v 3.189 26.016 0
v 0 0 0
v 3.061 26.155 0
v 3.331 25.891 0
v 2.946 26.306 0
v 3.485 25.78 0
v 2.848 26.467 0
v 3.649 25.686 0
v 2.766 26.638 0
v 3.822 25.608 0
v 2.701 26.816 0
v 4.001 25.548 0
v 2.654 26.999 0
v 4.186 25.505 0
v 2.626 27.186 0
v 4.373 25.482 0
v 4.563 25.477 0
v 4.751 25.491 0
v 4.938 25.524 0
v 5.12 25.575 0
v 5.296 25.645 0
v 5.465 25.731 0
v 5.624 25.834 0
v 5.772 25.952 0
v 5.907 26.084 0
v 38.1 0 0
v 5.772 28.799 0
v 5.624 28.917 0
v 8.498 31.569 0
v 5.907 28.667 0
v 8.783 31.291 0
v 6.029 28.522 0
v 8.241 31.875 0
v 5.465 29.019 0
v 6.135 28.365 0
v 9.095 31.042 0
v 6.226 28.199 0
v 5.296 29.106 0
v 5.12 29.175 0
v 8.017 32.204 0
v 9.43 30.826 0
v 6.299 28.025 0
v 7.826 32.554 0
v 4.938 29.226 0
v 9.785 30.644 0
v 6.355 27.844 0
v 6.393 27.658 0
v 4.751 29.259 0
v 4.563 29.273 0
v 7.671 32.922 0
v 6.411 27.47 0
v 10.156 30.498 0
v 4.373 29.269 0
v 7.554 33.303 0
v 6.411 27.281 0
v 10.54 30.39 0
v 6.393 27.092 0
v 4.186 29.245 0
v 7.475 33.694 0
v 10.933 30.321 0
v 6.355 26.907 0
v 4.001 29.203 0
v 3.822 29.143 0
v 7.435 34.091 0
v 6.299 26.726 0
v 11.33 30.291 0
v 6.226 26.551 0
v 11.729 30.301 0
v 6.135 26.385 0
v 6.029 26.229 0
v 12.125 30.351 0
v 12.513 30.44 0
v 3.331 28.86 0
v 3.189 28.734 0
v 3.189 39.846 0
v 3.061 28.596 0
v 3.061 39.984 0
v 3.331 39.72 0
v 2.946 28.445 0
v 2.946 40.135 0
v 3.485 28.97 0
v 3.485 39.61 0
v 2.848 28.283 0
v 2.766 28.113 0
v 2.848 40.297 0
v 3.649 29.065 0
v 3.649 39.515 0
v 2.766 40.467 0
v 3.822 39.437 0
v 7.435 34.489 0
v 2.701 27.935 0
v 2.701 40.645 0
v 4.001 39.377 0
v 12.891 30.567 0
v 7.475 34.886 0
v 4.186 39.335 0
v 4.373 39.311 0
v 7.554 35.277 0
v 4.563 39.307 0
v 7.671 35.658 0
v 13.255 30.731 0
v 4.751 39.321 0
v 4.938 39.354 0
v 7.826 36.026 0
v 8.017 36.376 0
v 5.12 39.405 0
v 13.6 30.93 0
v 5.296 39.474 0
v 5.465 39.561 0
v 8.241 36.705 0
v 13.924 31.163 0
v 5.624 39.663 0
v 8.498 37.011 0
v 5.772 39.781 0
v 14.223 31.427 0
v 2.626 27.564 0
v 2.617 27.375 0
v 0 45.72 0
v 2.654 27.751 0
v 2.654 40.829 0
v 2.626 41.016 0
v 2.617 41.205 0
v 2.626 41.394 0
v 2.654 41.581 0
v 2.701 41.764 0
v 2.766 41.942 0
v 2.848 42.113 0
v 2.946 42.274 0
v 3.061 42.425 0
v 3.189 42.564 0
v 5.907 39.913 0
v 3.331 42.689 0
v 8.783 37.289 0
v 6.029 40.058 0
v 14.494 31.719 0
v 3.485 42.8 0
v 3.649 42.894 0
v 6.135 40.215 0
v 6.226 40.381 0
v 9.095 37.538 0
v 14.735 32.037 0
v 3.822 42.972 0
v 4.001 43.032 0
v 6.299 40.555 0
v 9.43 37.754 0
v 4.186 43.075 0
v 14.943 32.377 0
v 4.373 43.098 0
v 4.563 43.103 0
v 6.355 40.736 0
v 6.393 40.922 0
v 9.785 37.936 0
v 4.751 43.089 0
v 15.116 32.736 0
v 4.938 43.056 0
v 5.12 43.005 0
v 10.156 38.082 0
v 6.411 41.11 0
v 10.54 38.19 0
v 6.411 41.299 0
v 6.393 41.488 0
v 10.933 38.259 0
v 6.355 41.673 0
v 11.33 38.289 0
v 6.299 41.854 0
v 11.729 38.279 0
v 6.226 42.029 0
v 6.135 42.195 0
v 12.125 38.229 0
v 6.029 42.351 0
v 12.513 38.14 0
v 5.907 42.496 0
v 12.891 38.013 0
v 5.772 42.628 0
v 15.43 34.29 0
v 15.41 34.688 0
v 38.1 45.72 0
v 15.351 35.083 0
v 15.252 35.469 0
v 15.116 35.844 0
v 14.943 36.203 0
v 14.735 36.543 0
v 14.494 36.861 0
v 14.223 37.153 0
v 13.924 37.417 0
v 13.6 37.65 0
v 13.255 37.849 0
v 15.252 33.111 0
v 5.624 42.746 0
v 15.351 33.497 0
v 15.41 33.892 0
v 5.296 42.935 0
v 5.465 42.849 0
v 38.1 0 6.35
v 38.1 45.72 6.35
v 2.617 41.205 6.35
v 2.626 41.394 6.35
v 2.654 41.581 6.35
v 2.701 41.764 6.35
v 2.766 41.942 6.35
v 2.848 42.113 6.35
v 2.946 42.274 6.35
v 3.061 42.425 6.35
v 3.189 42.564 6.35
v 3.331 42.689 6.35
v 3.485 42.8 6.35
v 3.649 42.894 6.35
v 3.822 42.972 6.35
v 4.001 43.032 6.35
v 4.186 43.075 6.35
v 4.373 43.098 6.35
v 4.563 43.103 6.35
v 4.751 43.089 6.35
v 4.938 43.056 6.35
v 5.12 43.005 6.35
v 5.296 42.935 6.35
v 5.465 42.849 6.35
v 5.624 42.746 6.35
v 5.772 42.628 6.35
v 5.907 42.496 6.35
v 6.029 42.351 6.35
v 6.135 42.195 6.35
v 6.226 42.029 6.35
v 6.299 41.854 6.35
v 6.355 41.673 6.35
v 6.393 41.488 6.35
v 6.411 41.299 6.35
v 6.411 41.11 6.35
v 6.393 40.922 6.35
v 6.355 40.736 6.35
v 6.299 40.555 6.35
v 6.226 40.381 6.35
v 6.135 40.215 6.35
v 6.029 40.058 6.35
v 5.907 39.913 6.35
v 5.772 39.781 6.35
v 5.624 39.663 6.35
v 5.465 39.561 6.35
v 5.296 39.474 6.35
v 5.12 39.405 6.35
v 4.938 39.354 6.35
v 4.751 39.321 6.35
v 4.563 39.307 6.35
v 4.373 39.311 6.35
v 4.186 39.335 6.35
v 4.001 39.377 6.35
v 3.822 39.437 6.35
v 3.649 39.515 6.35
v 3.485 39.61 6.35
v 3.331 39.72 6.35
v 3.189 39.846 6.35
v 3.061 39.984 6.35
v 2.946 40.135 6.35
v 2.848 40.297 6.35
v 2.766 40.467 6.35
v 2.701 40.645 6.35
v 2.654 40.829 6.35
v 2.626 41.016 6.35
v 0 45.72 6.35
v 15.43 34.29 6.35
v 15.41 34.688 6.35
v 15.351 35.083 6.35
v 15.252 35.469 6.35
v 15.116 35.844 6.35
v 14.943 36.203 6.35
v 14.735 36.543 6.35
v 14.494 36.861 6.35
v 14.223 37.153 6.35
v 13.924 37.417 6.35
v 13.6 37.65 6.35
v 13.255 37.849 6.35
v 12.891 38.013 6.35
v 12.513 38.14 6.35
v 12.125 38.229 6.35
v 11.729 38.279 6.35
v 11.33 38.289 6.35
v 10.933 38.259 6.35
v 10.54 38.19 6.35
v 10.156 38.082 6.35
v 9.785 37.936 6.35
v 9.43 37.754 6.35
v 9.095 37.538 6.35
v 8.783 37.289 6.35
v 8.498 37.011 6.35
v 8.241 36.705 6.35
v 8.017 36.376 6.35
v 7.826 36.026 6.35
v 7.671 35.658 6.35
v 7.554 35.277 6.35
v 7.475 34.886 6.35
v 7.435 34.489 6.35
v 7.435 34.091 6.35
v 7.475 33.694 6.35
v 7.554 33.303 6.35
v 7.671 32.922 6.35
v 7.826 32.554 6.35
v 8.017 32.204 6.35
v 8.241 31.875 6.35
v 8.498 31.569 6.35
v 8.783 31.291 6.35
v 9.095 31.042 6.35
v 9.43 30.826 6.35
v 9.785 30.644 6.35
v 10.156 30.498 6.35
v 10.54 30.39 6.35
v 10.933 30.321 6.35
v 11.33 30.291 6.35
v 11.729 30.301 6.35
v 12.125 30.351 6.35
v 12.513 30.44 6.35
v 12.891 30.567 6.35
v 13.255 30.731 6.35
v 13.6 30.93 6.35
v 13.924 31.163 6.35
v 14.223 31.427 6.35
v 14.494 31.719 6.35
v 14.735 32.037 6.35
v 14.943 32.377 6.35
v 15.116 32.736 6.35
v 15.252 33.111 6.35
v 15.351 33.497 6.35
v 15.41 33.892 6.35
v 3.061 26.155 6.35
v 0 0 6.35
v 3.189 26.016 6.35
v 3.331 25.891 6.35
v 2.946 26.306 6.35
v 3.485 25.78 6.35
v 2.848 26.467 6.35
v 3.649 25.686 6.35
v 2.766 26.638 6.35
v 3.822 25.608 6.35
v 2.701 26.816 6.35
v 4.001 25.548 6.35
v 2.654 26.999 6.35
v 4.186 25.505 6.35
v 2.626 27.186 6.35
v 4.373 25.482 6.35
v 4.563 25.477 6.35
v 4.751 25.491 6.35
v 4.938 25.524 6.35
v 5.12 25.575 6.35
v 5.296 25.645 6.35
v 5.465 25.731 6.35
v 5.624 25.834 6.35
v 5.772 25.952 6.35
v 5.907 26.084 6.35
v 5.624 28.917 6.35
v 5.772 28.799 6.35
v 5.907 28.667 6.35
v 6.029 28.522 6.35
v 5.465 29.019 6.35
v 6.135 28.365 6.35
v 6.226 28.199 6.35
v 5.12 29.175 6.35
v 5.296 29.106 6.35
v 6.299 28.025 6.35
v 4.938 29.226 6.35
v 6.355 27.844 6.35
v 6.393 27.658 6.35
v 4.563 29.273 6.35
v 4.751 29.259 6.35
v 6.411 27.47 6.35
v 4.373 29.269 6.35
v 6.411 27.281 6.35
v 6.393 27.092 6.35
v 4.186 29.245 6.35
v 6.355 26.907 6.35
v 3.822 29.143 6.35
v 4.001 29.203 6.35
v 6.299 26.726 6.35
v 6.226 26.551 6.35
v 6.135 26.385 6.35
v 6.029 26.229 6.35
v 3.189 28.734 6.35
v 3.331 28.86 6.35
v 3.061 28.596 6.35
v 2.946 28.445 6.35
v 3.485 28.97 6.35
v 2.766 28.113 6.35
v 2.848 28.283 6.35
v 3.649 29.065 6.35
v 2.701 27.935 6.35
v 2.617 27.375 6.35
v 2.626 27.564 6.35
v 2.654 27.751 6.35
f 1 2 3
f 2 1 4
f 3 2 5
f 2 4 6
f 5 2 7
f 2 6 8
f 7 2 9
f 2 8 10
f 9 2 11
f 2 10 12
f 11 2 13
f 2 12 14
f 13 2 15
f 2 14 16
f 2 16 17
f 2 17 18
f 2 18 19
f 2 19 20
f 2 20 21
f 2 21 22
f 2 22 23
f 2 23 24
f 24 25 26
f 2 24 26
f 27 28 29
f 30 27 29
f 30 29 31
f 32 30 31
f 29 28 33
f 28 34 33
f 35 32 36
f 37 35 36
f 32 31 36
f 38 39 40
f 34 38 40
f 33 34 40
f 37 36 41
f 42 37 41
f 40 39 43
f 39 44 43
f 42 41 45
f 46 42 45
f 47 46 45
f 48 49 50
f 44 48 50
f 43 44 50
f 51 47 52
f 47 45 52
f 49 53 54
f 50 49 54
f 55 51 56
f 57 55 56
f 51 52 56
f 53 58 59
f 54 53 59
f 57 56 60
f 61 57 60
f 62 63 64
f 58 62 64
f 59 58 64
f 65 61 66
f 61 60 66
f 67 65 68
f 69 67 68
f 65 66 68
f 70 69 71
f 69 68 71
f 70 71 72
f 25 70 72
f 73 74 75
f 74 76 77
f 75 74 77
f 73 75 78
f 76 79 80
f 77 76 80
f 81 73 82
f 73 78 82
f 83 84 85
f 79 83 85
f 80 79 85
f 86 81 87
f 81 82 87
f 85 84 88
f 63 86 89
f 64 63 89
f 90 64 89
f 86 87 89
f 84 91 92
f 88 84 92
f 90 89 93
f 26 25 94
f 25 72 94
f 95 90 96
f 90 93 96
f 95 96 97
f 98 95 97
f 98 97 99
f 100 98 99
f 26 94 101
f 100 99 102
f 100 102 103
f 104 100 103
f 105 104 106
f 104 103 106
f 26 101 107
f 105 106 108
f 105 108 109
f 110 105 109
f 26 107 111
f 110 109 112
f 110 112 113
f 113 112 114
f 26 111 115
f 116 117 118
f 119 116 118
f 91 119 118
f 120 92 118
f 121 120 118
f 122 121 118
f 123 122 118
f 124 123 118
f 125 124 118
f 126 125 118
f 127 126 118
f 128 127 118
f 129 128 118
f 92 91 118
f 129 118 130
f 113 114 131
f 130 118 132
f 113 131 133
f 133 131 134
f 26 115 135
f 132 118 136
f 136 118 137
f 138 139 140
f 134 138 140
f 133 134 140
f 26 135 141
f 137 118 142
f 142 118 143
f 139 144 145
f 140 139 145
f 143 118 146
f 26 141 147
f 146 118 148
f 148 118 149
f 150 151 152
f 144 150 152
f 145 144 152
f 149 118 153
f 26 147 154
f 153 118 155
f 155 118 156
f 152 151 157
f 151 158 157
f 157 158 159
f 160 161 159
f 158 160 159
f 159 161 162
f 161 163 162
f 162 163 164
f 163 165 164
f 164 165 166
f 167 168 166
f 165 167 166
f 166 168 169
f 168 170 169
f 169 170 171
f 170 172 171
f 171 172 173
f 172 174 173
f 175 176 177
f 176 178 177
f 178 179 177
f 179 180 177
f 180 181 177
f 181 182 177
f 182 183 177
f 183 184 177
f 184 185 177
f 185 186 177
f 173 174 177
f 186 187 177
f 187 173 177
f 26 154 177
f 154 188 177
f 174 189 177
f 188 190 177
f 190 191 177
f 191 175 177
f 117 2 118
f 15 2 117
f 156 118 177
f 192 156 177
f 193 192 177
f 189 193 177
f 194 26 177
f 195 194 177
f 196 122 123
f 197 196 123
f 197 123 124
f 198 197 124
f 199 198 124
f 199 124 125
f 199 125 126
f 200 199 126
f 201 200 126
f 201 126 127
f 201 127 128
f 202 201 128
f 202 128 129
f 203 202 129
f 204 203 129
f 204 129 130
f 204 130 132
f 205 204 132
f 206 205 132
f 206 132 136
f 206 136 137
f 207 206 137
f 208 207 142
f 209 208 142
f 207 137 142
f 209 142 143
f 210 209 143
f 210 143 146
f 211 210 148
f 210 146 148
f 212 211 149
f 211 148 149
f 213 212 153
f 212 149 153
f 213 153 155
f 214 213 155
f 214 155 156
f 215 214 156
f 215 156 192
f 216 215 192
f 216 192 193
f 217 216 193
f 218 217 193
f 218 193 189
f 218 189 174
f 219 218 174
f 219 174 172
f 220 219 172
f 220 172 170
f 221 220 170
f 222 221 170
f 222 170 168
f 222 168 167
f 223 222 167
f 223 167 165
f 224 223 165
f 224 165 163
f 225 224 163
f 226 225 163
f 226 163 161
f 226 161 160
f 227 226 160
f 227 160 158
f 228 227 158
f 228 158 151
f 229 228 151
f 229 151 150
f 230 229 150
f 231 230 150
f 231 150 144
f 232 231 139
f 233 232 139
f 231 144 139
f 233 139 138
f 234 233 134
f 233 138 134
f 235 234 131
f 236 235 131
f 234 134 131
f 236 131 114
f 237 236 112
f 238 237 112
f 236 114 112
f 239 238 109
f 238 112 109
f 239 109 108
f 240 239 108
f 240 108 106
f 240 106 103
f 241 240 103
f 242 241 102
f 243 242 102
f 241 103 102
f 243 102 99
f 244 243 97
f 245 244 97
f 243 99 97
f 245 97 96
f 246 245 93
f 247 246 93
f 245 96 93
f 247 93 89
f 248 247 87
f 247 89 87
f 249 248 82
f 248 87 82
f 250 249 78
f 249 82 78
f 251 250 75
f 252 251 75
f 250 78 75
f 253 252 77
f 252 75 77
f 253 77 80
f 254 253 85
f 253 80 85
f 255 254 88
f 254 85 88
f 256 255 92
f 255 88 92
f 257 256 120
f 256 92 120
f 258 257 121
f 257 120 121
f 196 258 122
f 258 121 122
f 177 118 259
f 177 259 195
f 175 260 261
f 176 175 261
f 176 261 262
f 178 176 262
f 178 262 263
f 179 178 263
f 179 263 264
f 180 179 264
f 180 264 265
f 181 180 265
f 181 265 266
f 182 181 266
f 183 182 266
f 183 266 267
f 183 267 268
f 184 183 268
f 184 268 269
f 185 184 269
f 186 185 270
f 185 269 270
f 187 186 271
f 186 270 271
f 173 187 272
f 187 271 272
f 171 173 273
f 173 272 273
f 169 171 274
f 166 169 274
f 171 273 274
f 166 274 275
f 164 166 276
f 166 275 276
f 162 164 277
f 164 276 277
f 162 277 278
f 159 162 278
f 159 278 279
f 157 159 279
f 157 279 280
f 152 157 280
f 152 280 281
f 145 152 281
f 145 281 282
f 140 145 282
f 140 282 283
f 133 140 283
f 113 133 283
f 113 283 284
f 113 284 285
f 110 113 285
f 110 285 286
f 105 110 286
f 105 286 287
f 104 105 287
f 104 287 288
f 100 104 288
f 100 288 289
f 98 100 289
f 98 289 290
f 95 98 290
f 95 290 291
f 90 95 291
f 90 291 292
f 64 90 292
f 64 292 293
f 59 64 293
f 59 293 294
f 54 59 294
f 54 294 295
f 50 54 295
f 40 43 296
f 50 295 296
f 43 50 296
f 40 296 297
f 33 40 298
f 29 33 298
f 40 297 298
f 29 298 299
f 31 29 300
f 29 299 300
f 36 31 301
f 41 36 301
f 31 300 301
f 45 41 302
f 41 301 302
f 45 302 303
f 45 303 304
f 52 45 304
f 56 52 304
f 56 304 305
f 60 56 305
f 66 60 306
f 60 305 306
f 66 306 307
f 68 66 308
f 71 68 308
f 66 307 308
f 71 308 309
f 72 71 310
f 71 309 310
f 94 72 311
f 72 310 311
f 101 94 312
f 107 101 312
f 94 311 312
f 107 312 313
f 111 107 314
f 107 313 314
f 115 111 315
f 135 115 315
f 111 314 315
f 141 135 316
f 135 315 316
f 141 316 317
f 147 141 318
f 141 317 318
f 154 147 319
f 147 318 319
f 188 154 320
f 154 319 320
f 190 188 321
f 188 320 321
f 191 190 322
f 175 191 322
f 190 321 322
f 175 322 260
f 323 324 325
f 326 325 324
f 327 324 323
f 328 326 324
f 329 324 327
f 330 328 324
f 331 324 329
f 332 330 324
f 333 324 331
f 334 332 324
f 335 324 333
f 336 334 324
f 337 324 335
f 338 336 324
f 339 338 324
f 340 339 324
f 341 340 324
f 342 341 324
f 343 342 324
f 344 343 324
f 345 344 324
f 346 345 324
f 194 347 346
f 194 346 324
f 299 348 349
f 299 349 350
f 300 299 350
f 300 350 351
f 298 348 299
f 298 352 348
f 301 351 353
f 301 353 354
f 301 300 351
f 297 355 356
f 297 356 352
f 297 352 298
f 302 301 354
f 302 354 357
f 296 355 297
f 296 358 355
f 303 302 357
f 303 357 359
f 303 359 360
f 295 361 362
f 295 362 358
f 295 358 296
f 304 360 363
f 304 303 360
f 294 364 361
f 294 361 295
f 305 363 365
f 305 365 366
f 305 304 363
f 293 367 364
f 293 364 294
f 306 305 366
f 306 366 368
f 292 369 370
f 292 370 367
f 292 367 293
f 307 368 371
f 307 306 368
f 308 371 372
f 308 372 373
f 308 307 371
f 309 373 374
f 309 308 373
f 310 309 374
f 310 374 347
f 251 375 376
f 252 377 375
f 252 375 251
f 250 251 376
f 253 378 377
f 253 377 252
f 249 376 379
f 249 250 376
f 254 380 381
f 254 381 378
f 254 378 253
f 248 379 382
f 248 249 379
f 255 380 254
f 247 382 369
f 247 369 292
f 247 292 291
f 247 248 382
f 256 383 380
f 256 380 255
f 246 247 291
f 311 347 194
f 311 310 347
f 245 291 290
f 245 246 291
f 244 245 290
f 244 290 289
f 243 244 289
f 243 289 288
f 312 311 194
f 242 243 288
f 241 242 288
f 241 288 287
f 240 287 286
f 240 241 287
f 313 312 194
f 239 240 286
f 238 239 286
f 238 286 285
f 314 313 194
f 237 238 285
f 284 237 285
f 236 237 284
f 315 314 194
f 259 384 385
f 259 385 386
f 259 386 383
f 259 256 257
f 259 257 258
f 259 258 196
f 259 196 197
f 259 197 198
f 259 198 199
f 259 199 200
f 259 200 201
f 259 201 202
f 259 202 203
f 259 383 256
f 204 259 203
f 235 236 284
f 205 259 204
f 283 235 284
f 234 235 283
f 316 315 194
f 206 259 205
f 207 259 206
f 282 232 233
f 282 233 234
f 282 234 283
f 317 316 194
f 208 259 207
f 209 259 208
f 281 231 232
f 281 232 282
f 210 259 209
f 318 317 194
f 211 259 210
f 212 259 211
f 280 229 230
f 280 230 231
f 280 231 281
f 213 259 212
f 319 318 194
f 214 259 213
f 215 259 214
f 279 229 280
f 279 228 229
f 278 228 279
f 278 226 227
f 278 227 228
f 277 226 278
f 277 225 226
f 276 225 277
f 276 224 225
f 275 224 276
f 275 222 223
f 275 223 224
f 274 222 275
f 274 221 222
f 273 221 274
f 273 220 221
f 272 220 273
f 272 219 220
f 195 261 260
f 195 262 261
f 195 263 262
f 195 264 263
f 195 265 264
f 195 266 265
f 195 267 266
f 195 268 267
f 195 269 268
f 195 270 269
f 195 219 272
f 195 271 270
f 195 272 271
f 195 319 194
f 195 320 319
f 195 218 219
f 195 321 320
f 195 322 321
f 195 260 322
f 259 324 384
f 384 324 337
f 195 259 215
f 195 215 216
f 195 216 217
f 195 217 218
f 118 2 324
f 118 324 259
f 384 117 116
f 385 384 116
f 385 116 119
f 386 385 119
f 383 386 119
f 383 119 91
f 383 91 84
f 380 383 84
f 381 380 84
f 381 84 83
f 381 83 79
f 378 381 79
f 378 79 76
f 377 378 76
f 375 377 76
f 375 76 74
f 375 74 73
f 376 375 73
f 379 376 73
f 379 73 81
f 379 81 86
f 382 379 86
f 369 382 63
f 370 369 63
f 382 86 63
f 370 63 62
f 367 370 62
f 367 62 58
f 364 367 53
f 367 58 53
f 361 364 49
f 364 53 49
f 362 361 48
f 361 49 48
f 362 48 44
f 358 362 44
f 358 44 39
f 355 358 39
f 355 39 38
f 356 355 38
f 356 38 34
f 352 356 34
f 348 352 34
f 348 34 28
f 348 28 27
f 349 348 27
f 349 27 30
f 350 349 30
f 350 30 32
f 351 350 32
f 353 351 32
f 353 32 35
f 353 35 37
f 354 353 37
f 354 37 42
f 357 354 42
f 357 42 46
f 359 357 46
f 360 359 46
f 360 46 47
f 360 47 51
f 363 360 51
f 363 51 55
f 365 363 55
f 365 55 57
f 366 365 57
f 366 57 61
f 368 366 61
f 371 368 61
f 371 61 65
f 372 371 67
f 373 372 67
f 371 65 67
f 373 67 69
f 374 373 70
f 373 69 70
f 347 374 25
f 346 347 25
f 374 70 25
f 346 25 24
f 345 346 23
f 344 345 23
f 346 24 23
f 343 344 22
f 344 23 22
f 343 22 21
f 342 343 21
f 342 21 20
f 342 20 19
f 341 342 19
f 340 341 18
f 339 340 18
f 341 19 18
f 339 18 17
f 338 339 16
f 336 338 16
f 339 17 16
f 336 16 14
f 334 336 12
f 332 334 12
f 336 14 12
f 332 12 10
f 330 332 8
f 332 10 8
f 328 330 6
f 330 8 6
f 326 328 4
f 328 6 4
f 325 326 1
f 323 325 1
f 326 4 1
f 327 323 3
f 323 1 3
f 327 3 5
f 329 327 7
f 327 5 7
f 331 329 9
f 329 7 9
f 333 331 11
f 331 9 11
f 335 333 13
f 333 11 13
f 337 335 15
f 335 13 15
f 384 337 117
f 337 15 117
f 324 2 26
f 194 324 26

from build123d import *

# Parameters (mm, degrees)
SKETCH1_W                 = 38.1
SKETCH1_H                 = 45.72
BOSS_EXTRUDE1_DEPTH       = 6.35
SKETCH2_R                 = 4
CUT_EXTRUDE1_DEPTH        = 1
CUT_EXTRUDE1_DEPTH_BACK   = 7.35
F_6_CLEARANCE_HOLE2_D     = 3.7973
F_6_CLEARANCE_HOLE2_DEPTH = 6.35


with BuildPart() as part:
    # Sketch1 → Boss-Extrude1 (new body)
    with BuildSketch(Plane.XY):
        with Locations((19.05, 22.86)):
            Rectangle(SKETCH1_W, SKETCH1_H)
    extrude(amount=BOSS_EXTRUDE1_DEPTH)

    # Sketch2 → Cut-Extrude1 (cut, two sides)
    with BuildSketch(Plane.XY.offset(6.35)) as cut_extrude1_sk:
        with Locations((11.43, 34.29)):
            Circle(SKETCH2_R)
    extrude(amount=CUT_EXTRUDE1_DEPTH, mode=Mode.SUBTRACT)
    extrude(cut_extrude1_sk.sketch, amount=-CUT_EXTRUDE1_DEPTH_BACK, mode=Mode.SUBTRACT)

    # #6 Clearance Hole2
    with Locations(Plane.XY.offset(6.35)):
        with Locations((4.515202787, 41.204797213), (4.515202787, 27.375202787)):
            Hole(F_6_CLEARANCE_HOLE2_D / 2, depth=F_6_CLEARANCE_HOLE2_DEPTH)


solid = part.part
